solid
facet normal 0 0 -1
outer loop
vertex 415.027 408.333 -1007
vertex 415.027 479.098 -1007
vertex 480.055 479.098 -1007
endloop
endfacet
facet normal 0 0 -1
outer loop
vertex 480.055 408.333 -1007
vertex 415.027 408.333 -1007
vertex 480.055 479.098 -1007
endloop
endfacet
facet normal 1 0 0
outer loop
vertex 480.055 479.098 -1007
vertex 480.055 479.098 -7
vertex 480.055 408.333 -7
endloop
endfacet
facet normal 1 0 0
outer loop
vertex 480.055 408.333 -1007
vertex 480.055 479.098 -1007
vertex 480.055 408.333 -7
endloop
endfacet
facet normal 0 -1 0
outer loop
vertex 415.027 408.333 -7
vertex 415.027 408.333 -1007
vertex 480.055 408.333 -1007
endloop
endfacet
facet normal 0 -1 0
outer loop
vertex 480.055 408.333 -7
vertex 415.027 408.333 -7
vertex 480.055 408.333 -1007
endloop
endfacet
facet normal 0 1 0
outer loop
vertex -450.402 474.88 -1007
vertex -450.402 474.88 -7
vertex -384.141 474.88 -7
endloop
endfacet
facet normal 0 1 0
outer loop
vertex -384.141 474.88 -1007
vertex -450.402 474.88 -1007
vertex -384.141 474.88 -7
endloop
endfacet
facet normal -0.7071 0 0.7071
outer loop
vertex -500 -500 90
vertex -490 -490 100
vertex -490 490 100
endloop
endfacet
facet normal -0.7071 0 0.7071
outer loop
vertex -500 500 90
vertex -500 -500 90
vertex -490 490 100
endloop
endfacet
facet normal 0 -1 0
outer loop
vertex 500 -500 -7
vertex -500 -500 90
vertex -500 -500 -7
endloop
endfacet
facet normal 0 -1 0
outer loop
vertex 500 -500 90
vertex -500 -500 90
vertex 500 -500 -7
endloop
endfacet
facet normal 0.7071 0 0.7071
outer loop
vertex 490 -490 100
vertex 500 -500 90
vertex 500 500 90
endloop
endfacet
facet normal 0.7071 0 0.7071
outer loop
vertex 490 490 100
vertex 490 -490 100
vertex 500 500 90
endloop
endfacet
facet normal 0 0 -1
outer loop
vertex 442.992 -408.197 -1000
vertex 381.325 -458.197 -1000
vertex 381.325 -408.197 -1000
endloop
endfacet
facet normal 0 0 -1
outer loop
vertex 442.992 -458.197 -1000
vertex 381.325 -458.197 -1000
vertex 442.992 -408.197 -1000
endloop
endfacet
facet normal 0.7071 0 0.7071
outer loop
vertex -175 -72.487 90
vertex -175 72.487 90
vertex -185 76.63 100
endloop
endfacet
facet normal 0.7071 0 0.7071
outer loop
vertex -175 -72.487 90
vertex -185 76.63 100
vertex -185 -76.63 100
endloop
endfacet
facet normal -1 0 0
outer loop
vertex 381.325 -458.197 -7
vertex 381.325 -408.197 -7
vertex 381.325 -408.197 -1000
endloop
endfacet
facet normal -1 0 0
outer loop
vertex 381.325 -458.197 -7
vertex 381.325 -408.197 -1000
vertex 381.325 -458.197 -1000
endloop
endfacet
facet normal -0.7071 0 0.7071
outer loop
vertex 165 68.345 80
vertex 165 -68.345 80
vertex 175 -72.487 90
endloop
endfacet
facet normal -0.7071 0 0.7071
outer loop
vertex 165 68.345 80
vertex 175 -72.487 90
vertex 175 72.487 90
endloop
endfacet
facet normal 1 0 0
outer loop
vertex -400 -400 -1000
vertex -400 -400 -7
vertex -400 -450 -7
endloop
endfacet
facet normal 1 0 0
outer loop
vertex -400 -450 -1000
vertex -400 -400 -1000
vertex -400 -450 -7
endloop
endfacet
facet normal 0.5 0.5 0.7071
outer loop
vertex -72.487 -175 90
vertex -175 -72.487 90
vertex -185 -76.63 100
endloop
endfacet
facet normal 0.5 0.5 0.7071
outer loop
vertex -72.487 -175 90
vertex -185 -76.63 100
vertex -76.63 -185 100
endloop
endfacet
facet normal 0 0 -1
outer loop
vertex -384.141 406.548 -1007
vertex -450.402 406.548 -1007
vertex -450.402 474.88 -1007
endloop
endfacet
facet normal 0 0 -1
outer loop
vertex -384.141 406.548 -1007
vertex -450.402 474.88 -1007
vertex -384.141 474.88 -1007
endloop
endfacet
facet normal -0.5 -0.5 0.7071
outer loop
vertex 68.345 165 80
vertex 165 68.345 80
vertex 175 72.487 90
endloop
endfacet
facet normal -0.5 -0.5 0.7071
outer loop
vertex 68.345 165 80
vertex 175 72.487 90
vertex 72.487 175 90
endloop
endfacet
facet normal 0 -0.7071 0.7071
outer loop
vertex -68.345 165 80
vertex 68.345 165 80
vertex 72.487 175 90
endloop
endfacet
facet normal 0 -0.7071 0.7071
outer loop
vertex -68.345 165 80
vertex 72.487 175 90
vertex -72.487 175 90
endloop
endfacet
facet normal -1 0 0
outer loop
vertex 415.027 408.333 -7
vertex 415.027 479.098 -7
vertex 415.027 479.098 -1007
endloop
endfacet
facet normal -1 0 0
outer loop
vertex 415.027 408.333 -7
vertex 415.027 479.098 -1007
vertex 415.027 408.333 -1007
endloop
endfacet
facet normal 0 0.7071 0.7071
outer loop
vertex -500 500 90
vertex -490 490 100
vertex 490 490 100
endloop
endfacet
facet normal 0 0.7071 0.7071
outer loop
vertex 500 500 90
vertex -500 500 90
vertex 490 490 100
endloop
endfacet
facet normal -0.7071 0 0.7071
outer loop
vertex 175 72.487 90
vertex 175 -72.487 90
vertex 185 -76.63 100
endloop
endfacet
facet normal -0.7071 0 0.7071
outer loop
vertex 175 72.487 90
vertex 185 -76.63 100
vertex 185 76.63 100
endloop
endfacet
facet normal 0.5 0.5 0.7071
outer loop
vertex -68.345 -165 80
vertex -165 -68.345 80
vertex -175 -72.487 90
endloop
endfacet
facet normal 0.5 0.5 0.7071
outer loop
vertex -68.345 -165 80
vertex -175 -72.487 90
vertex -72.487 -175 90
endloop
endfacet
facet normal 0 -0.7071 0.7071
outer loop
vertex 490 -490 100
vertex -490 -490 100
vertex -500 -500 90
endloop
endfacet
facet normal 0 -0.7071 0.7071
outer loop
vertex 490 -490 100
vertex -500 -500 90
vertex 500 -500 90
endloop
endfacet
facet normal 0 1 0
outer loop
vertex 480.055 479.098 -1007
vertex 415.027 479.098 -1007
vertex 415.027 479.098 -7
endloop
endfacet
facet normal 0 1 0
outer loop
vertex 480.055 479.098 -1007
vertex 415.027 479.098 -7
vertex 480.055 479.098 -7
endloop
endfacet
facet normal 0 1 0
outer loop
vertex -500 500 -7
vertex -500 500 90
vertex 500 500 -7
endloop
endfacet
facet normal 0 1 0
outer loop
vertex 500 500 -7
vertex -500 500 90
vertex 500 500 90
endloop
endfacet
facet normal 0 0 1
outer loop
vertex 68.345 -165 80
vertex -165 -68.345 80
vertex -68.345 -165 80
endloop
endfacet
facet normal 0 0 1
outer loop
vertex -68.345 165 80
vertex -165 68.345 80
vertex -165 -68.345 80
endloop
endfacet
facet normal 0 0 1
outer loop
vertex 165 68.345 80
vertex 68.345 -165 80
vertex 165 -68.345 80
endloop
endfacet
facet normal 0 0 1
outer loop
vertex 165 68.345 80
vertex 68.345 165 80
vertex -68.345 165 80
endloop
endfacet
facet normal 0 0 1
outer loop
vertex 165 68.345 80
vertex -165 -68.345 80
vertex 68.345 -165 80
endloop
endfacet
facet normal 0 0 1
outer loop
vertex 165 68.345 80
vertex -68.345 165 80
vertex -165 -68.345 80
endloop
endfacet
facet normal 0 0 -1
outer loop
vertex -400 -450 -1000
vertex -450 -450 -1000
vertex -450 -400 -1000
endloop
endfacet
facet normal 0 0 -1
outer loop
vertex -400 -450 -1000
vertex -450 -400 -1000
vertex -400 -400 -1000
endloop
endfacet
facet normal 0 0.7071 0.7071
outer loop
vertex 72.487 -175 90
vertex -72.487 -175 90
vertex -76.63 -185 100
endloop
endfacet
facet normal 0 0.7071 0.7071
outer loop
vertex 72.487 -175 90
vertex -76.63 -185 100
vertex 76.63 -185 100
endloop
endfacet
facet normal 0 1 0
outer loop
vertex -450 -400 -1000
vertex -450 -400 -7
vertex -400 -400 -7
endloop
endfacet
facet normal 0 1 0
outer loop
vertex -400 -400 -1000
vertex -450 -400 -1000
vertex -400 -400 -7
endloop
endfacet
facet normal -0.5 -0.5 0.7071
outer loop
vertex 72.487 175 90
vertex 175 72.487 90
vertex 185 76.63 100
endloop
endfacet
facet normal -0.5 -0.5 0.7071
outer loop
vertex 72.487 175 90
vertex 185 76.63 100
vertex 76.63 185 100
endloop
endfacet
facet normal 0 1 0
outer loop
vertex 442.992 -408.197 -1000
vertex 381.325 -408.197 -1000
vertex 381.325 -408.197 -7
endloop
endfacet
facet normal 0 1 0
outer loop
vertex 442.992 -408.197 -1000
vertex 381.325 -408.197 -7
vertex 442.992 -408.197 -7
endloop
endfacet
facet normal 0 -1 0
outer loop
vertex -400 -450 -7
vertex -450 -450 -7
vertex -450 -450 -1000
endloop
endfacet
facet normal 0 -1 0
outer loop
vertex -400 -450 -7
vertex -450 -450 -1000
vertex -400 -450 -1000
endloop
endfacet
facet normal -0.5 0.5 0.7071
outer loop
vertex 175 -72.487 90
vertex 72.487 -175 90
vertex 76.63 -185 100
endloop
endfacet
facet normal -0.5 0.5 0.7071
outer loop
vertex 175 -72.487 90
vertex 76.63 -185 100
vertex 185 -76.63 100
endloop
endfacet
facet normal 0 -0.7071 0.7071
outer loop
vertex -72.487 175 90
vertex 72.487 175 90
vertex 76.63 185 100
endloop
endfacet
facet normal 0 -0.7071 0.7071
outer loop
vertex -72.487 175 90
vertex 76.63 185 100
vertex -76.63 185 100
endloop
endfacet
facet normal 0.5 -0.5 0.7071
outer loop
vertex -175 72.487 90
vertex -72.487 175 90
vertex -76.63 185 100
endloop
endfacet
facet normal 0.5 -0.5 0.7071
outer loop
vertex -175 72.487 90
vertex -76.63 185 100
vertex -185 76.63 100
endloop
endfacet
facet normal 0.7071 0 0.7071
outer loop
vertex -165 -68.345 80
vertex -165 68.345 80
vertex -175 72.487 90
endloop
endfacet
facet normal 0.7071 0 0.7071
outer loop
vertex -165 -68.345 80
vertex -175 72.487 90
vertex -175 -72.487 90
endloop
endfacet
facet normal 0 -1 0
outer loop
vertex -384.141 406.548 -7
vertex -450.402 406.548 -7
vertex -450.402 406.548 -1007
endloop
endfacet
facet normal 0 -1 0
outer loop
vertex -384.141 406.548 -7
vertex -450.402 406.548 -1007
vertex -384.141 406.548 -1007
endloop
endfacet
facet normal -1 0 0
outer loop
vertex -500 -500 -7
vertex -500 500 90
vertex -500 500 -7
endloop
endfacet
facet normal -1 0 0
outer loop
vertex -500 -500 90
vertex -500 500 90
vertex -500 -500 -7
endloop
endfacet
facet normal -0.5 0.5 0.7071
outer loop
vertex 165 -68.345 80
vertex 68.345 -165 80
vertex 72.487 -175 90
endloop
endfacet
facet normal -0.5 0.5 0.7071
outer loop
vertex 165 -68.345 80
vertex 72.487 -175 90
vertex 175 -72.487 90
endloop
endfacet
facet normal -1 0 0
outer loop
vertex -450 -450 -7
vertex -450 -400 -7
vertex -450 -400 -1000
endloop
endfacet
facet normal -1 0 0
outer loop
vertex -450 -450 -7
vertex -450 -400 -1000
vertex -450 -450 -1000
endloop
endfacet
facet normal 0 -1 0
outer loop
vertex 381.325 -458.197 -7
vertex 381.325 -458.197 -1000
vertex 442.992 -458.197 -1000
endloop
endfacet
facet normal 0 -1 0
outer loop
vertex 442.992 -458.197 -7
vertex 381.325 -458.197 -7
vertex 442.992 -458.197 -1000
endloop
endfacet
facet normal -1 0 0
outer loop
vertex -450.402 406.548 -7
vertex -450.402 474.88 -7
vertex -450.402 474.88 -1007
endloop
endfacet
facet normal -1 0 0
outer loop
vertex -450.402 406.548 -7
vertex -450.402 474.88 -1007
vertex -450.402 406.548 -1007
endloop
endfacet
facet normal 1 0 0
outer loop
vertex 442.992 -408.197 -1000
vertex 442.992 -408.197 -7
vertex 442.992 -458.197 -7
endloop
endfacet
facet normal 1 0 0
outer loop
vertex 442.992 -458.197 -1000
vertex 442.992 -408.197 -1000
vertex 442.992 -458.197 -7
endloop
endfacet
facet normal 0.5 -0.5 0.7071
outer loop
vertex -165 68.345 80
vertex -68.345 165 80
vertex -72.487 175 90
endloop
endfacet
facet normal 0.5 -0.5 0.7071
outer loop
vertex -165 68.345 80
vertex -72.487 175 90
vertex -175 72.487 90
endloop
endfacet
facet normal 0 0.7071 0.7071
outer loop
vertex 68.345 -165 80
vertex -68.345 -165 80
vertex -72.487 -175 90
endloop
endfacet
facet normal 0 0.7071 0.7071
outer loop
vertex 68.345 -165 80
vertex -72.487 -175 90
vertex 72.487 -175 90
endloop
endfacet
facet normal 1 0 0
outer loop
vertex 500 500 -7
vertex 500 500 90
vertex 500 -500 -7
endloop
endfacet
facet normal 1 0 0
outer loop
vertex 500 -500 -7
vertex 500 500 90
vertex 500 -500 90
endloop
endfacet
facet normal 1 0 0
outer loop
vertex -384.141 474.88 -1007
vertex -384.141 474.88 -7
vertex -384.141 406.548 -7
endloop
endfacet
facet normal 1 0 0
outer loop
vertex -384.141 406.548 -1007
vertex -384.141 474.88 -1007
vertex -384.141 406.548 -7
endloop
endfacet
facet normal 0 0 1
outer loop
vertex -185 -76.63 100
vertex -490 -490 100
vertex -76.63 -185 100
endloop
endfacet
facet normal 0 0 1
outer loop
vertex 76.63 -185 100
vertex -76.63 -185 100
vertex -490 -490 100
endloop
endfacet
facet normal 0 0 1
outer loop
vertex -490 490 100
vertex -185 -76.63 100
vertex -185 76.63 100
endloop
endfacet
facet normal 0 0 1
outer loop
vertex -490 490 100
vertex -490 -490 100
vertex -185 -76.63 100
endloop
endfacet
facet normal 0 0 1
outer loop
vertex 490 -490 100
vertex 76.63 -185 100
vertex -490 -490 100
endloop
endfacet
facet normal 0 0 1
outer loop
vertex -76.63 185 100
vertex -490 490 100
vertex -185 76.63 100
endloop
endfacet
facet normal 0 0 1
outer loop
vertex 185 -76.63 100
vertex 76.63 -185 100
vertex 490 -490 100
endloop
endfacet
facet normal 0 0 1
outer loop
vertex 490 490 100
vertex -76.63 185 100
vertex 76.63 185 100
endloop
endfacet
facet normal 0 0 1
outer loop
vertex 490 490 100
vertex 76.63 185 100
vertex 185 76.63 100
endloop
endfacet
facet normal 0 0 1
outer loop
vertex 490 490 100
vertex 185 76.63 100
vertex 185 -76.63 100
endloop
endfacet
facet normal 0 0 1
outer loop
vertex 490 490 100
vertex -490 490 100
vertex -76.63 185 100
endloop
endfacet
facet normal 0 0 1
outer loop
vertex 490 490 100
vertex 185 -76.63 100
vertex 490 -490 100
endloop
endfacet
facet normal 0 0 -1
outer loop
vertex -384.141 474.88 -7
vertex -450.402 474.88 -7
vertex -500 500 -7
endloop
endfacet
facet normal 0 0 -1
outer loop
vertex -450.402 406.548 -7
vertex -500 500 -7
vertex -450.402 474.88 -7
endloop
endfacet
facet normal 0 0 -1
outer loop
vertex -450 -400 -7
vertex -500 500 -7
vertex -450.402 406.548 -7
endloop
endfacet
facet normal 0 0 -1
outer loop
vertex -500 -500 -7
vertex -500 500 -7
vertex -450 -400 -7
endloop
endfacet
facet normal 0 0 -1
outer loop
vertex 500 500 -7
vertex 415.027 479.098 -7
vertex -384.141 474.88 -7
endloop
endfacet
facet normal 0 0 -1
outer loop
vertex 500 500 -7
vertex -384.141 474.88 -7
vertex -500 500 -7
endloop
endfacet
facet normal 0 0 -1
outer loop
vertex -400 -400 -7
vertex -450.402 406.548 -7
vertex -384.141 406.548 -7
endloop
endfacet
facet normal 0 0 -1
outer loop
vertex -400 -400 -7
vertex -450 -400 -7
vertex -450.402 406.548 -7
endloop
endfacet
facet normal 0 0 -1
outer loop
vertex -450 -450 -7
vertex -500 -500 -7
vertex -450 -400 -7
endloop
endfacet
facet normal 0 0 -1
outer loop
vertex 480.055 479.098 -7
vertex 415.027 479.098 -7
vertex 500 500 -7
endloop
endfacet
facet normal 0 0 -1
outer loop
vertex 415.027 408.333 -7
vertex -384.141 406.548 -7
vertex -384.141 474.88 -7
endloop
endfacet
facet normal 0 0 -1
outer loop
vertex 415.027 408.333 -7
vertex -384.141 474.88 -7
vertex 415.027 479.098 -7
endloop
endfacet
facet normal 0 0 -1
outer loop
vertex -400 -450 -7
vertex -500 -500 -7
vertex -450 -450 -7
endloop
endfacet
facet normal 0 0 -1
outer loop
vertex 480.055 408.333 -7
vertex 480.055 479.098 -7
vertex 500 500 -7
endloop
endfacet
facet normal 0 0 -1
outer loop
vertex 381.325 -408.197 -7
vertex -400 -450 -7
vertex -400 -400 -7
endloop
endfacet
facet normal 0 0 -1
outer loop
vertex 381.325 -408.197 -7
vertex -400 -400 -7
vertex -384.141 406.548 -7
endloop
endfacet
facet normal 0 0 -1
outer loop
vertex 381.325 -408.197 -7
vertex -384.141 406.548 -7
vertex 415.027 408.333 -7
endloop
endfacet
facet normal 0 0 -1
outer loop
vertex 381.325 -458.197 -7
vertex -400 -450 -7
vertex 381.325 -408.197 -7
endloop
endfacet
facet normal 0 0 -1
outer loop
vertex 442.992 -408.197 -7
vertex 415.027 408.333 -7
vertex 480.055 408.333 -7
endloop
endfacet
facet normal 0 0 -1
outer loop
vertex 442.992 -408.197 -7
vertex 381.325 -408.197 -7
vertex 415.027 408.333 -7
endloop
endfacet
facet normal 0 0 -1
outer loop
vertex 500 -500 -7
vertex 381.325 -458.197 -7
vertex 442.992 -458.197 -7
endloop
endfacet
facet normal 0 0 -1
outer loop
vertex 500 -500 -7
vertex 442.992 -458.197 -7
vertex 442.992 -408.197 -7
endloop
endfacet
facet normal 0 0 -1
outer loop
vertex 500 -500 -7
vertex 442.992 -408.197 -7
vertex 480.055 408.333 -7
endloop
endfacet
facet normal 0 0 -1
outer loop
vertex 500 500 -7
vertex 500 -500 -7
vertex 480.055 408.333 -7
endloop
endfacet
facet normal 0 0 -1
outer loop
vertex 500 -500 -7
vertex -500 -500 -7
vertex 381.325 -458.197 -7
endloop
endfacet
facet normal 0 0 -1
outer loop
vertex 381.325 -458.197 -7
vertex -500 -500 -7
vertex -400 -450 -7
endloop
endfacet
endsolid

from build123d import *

# Parameters (mm, degrees)
F0_W      = 1000
F0_H      = 1000
F1_DEPTH  = 100
F3_DEPTH  = 20
F4_SIZE   = 9.99999
F5_W      = 50
F5_H      = 50
F6_DEPTH  = 1000
F7_W      = 61.6666623382
F7_H      = 50
F8_DEPTH  = 1000
F9_W      = 1000
F9_H      = 1000
F9_W_2    = 50
F9_H_2    = 50
F9_W_3    = 61.6666623382
F10_W     = 57.3770701885
F10_H     = 57.3770701885
F10_W_2   = 65.0272965431
F10_H_2   = 76.5027403831
F11_DEPTH = 7
F12_W     = 66.2613213062
F12_H     = 68.3319568634
F13_DEPTH = 1000
F14_W     = 65.0273263454
F14_H     = 70.7650482655
F15_DEPTH = 1000


# Not quite as in the source:
# - a fillet or chamfer is up to 0.001 mm smaller than in the source, because OpenCascade refuses the exact size


with BuildPart() as f1:
    # F0 (on Top) → F1 (new body)
    with BuildSketch(Plane.XY):
        Rectangle(F0_W, F0_H)
    extrude(amount=F1_DEPTH)

    # F2 (on face) → F3 (cut)
    with BuildSketch(Plane.XY.offset(100)):
        Polygon((72.4873734153, -175), (175, -72.4873734153), (175, 72.4873734153), (72.4873734153, 175), (-72.4873734153, 175), (-175, 72.4873734153), (-175, -72.4873734153), (-72.4873734153, -175), align=None)
    extrude(amount=-F3_DEPTH, mode=Mode.SUBTRACT)

    # F4 (size 10 in the source; OpenCascade refuses exactly that, so slightly less here)
    f4_edges = [f1.edges().sort_by_distance(p)[0] for p in [
        (123.743687, -123.743687, 80),
        (175, 0, 80),
        (123.743687, 123.743687, 80),
        (0, 175, 80),
        (-123.743687, 123.743687, 80),
        (-175, 0, 80),
        (-123.743687, -123.743687, 80),
        (0, -175, 80),
        (0, -500, 100),
        (-500, 0, 100),
        (500, 0, 100),
        (0, 500, 100),
        (123.743687, -123.743687, 100),
        (175, 0, 100),
        (123.743687, 123.743687, 100),
        (0, 175, 100),
        (-123.743687, 123.743687, 100),
        (-175, 0, 100),
        (-123.743687, -123.743687, 100),
        (0, -175, 100),
    ]]
    chamfer(f4_edges, length=F4_SIZE)

    # F5 (on face) → F6 (join)
    with BuildSketch(Plane(origin=(0, 0, 0), x_dir=(1, 0, 0), z_dir=(0, 0, -1))):
        with Locations((-425, 425)):
            Rectangle(F5_W, F5_H)
    extrude(amount=F6_DEPTH)

    # F7 (on face) → F8 (join)
    with BuildSketch(Plane(origin=(0, 0, 0), x_dir=(1, 0, 0), z_dir=(0, 0, -1))):
        with Locations((412.1584743261, 433.19670856)):
            Rectangle(F7_W, F7_H)
    extrude(amount=F8_DEPTH)

    # F9 (on face) + F10 (on face) → F11 (join)
    with BuildSketch(Plane(origin=(0, 0, 0), x_dir=(1, 0, 0), z_dir=(0, 0, -1))):
        Rectangle(F9_W, F9_H)
        with Locations((-425, 425)):
            Rectangle(F9_W_2, F9_H_2, mode=Mode.SUBTRACT)
        with Locations((412.1584743261, 433.19670856)):
            Rectangle(F9_W_3, F9_H_2, mode=Mode.SUBTRACT)
    with BuildSketch(Plane(origin=(0, 0, 0), x_dir=(1, 0, 0), z_dir=(0, 0, -1))):
        with Locations((-409.2896133661, -459.9726945162)):
            Rectangle(F10_W, F10_H)
        with Locations((434.1530203819, -438.9344155788)):
            Rectangle(F10_W_2, F10_H_2)
    extrude(amount=F11_DEPTH)

    # F12 (on face) → F13 (join)
    with BuildSketch(Plane(origin=(0, 0, -7), x_dir=(1, 0, 0), z_dir=(0, 0, -1))):
        with Locations((-417.2714799643, -440.7140314579)):
            Rectangle(F12_W, F12_H)
    extrude(amount=F13_DEPTH)

    # F14 (on face) → F15 (join)
    with BuildSketch(Plane(origin=(0, 0, -7), x_dir=(1, 0, 0), z_dir=(0, 0, -1))):
        with Locations((447.5409835577, -443.7158554792)):
            Rectangle(F14_W, F14_H)
    extrude(amount=F15_DEPTH)


solid = f1.part
